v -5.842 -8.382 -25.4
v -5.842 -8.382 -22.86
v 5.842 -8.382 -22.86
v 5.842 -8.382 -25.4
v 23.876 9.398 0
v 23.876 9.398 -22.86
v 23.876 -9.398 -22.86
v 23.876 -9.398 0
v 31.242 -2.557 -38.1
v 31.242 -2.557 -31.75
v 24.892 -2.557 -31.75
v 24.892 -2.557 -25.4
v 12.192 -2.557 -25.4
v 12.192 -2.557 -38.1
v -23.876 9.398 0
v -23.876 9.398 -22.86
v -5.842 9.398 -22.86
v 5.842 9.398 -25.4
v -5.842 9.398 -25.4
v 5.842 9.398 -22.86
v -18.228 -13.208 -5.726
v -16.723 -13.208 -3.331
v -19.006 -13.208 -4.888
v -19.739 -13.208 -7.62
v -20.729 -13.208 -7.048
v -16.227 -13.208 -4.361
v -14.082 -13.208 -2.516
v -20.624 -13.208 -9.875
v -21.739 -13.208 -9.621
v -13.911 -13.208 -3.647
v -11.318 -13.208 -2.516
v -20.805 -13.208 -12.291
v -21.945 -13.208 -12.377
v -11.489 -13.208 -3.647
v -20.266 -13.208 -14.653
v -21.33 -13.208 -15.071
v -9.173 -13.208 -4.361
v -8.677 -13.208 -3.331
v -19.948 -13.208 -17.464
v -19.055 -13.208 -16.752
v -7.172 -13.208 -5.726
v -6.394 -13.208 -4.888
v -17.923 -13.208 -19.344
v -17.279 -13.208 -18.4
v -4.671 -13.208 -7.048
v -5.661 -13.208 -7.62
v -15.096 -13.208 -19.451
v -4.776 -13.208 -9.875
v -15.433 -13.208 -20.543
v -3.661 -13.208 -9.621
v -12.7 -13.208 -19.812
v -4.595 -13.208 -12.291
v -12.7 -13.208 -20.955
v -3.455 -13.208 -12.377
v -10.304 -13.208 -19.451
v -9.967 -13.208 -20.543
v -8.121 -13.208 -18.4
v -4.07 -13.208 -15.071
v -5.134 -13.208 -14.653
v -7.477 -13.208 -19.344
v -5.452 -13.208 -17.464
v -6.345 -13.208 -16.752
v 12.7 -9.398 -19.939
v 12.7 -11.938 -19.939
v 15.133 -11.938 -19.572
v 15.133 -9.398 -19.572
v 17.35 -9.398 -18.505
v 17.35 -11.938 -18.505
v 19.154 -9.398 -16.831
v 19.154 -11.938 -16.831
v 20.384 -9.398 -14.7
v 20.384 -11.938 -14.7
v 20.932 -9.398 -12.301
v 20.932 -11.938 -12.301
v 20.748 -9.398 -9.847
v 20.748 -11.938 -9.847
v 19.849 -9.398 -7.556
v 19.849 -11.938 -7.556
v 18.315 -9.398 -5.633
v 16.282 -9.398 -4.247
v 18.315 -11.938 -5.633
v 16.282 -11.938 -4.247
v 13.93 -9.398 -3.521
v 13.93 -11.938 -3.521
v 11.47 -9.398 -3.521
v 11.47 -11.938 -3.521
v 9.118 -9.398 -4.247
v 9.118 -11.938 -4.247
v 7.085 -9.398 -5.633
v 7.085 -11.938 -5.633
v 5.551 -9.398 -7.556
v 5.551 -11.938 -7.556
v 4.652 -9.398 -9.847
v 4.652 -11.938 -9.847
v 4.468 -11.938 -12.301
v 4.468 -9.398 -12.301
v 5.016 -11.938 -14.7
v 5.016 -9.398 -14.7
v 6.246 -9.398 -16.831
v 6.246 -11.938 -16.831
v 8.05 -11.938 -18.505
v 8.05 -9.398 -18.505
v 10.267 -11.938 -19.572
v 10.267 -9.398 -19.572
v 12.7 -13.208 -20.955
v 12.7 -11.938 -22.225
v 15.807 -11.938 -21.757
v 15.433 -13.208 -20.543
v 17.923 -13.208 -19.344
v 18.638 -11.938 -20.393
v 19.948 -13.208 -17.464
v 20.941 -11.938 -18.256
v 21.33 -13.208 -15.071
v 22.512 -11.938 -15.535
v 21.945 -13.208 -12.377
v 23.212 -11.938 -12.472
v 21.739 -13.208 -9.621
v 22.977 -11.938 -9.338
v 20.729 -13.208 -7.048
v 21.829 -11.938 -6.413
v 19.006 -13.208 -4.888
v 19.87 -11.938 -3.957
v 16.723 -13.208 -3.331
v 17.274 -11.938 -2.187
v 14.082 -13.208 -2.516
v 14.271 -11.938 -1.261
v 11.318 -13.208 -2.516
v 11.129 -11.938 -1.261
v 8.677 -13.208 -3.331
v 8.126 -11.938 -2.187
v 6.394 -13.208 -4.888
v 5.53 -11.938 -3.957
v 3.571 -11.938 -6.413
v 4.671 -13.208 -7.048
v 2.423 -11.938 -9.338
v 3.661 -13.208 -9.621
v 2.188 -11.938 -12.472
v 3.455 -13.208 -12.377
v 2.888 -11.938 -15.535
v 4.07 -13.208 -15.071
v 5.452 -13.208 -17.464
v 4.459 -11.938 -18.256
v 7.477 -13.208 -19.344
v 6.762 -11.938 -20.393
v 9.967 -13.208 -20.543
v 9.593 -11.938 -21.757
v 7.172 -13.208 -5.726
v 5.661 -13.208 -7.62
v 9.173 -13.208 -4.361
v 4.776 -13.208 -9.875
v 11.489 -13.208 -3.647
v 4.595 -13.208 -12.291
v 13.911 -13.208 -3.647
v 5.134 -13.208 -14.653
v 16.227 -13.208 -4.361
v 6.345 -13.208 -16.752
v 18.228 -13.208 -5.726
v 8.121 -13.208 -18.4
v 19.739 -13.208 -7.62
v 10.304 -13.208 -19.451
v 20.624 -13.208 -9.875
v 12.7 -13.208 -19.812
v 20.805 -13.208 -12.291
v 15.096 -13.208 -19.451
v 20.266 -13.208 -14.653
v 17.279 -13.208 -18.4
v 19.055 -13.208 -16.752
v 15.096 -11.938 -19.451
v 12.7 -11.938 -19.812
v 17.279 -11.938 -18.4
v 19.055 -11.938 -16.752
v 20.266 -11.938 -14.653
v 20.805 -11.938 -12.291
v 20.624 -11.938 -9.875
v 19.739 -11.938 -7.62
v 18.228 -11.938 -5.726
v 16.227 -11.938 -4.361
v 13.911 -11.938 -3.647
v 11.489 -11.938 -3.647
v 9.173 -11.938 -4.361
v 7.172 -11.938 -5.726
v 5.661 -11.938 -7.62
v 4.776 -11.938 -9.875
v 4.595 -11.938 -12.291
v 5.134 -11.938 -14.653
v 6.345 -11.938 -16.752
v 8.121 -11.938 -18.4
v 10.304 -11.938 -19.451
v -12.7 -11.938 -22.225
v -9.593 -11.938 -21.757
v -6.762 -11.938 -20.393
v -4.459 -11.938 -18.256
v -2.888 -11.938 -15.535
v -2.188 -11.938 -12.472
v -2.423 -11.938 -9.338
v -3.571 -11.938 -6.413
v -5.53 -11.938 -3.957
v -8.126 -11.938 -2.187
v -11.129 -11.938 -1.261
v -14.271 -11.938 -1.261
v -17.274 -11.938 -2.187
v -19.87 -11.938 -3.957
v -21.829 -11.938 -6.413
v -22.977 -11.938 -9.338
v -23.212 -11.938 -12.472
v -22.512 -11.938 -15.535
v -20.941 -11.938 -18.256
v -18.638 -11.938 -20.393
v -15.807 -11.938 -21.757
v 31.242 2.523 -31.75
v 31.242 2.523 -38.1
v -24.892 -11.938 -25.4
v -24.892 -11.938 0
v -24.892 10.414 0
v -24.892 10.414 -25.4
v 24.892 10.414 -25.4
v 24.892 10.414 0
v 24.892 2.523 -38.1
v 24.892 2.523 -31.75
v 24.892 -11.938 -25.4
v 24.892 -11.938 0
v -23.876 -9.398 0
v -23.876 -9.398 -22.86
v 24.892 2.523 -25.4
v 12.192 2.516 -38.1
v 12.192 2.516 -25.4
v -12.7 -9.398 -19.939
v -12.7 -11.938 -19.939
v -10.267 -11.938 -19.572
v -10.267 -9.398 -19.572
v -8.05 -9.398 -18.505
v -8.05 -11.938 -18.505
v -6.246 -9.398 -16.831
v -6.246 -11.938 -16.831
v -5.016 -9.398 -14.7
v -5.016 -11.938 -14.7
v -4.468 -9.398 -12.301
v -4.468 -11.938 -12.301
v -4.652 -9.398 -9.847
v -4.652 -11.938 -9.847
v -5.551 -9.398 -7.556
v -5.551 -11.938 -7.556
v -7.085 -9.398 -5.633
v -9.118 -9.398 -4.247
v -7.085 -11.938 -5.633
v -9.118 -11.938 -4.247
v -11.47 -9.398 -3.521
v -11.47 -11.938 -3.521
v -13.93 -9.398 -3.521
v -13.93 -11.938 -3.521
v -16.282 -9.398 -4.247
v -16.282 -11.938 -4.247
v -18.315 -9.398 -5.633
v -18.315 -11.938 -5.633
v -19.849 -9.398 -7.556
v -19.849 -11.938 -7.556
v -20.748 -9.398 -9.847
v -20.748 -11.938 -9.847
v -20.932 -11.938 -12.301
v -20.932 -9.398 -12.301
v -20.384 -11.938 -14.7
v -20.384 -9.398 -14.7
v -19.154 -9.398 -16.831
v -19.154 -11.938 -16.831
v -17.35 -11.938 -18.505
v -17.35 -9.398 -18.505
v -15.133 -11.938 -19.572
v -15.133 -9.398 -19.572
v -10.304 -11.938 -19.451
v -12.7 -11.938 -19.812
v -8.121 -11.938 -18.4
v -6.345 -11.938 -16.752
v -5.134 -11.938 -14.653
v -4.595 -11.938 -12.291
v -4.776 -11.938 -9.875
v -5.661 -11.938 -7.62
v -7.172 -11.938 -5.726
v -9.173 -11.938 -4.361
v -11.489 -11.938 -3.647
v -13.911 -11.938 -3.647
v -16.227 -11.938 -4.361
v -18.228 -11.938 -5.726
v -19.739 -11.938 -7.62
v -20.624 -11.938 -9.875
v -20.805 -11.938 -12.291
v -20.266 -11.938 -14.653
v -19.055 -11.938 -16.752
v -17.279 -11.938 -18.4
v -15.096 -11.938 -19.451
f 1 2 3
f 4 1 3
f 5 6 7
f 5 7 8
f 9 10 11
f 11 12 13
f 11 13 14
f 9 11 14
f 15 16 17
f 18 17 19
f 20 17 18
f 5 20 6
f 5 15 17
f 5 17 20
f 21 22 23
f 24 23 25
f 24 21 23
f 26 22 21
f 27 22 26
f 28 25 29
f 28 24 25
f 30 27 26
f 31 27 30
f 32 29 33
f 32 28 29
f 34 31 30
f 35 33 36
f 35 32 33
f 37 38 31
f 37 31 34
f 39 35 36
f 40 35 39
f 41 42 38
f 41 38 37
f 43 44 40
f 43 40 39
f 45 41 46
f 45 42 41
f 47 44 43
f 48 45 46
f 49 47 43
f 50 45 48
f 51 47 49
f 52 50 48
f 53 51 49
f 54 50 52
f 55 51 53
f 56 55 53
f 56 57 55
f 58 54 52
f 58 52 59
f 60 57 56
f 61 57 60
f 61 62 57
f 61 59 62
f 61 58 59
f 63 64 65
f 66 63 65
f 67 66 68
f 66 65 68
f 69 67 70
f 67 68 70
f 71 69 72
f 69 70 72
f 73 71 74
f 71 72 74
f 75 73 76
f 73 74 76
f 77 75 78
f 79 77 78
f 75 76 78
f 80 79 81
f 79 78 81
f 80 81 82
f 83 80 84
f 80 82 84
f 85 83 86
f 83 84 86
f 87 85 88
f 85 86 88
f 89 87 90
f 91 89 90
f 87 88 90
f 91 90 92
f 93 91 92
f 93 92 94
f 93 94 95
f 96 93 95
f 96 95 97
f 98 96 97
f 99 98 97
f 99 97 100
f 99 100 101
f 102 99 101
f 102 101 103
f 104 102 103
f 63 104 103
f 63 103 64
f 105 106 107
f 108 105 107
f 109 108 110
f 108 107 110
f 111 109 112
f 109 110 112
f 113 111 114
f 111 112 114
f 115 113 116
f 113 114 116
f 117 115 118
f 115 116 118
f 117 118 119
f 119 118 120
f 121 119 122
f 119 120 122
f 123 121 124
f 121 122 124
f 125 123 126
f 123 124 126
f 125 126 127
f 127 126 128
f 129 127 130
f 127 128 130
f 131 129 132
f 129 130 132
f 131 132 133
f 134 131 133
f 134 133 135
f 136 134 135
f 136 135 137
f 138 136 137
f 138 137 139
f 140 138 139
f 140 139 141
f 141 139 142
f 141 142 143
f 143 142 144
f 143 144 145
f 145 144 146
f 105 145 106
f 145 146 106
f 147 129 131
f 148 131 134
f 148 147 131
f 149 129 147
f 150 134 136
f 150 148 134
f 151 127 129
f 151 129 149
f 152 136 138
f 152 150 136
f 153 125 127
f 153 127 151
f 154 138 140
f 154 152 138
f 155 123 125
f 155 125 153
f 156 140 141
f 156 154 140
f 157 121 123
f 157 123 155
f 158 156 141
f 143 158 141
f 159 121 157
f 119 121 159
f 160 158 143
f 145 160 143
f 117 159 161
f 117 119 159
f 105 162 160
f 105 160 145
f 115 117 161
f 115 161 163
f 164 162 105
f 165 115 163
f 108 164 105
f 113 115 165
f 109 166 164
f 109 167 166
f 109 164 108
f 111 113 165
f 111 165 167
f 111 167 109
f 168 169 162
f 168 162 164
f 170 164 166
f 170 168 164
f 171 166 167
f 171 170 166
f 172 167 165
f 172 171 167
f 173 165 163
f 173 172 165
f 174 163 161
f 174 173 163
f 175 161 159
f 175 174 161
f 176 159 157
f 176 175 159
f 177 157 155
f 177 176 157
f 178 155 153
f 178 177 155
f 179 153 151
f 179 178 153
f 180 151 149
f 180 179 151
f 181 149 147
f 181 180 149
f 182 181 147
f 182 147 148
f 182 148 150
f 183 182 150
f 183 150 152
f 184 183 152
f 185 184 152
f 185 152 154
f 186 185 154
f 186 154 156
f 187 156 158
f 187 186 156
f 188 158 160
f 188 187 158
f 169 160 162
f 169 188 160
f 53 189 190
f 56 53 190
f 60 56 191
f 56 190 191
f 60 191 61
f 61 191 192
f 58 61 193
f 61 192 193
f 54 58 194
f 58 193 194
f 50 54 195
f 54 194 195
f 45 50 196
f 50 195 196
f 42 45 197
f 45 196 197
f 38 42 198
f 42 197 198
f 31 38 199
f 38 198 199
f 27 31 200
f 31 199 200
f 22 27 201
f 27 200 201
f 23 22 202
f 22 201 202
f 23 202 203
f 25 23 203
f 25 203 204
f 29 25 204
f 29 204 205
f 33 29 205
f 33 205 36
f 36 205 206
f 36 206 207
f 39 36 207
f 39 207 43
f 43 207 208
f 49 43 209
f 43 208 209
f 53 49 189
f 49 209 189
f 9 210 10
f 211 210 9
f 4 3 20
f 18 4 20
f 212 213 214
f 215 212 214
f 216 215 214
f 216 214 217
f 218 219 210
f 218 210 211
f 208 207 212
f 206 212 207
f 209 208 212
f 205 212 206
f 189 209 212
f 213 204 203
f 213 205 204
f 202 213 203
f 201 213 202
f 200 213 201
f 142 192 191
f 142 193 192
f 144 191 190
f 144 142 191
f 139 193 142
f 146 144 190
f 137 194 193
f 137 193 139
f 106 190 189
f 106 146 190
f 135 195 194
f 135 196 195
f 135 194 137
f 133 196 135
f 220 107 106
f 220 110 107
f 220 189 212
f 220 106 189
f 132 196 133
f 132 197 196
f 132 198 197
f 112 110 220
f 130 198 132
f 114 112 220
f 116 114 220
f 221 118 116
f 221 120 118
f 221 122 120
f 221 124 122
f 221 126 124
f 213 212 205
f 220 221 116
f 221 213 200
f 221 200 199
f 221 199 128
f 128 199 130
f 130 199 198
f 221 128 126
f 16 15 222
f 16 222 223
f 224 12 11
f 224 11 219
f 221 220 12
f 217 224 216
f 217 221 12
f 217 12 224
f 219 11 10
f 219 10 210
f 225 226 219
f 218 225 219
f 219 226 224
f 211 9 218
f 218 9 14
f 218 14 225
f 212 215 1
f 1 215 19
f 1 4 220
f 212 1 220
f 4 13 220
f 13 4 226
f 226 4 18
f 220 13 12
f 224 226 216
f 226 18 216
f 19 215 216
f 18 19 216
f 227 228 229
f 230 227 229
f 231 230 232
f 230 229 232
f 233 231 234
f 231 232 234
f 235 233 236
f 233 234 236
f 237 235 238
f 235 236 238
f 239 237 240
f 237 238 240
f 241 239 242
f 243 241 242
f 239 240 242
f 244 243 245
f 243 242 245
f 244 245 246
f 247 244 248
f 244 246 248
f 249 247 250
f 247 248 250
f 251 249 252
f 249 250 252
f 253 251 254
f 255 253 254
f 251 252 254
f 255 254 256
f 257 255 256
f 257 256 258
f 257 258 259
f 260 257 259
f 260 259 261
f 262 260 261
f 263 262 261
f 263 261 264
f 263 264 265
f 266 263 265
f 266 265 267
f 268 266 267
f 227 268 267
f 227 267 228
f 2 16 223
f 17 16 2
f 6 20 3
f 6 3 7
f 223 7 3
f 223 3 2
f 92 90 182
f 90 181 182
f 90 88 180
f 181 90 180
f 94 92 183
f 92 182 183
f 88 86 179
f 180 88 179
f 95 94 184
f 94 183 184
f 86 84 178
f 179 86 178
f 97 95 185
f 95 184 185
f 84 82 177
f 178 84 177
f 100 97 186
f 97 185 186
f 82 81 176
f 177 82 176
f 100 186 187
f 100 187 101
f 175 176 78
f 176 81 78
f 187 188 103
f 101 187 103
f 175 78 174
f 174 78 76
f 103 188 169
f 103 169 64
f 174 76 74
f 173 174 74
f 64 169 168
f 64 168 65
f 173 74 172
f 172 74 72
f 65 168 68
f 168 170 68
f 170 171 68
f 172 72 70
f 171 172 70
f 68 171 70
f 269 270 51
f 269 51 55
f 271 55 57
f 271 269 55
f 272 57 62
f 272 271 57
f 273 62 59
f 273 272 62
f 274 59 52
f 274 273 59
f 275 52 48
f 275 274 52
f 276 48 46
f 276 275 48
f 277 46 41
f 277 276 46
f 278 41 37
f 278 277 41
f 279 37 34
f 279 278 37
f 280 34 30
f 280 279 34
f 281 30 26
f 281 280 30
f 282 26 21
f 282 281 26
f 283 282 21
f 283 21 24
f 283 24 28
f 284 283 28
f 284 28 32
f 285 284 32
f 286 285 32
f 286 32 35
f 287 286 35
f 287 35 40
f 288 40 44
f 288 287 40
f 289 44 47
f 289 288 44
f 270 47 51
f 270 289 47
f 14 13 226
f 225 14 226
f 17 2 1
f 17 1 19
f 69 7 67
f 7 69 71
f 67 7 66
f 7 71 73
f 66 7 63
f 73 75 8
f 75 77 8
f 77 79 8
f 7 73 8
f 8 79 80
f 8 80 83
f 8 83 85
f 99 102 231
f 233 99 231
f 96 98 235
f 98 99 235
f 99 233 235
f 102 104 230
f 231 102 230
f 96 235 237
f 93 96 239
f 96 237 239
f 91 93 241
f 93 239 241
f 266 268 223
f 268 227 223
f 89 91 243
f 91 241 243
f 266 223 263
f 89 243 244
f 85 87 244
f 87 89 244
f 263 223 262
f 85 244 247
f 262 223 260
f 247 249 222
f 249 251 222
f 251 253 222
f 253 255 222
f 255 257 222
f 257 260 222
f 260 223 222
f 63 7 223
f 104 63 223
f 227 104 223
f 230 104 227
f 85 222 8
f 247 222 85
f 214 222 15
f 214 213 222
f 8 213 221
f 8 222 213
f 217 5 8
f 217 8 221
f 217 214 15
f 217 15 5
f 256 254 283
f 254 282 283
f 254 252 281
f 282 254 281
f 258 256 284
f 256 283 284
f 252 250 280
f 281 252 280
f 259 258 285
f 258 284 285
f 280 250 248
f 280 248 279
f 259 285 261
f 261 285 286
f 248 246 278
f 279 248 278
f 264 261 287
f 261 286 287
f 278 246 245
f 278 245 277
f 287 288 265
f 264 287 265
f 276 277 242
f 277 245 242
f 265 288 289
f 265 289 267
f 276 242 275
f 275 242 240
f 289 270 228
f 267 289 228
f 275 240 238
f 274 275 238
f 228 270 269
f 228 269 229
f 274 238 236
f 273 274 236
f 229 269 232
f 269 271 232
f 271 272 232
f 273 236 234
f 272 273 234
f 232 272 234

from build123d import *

# Parameters (mm, degrees)
SKETCH1_W           = 49.784
SKETCH1_H           = 23.876
BOSS_EXTRUDE1_DEPTH = 25.4
SHELL1_T            = -2.54
CUT_EXTRUDE1_REACH  = 44.835
SKETCH2_R           = 8.255
CUT_EXTRUDE2_REACH  = 37.843
SKETCH4_W           = 11.684
SKETCH4_H           = 17.78
SKETCH5_R           = 10.541
SKETCH5_R_2         = 8.128
BOSS_EXTRUDE3_DEPTH = 1.27
BOSS_EXTRUDE4_DEPTH = 12.7
SKETCH8_W           = 6.35
SKETCH8_H           = 5.08
BOSS_EXTRUDE5_DEPTH = 6.35
SKETCH9_W           = 22.86
SKETCH9_H           = 18.796
CUT_EXTRUDE3_DEPTH  = 1.524
SKETCH10_W          = 22.86
SKETCH10_H          = 18.796
CUT_EXTRUDE4_DEPTH  = 1.524
CHAMFER1_SIZE       = 1.27
SKETCH11_W          = 49.784
SKETCH11_H          = 25.4
CUT_EXTRUDE5_DEPTH  = 1.524


with BuildPart() as part:
    # Sketch1 → Boss-Extrude1 (new body)
    with BuildSketch(Plane.XY):
        Rectangle(SKETCH1_W, SKETCH1_H)
    extrude(amount=-BOSS_EXTRUDE1_DEPTH)

    # Shell1
    shell1_openings = [part.faces().sort_by_distance(p)[0] for p in [
        (0, 0, 0),
    ]]
    offset(amount=SHELL1_T, openings=shell1_openings, kind=Kind.INTERSECTION)

    # Sketch2 → Cut-Extrude1 (cut, up to next)
    with BuildSketch(Plane.XZ.offset(11.938), mode=Mode.PRIVATE) as cut_extrude1_sk1:
        with Locations(Location((-12.7, -11.684, 0), (0, 0, 270))):
            Circle(SKETCH2_R)
    cut_extrude1_tool1 = extrude(cut_extrude1_sk1.sketch, amount=-CUT_EXTRUDE1_REACH, mode=Mode.PRIVATE) & part.part
    # Sketch2 → Cut-Extrude1 (cut, up to next)
    with BuildSketch(Plane.XZ.offset(11.938), mode=Mode.PRIVATE) as cut_extrude1_sk2:
        with Locations(Location((12.7, -11.684, 0), (0, 0, 270))):
            Circle(SKETCH2_R)
    cut_extrude1_tool2 = extrude(cut_extrude1_sk2.sketch, amount=-CUT_EXTRUDE1_REACH, mode=Mode.PRIVATE) & part.part
    add(cut_extrude1_tool1.solids().sort_by_distance((-12.7, -11.938, -11.684))[0], mode=Mode.SUBTRACT)
    add(cut_extrude1_tool2.solids().sort_by_distance((12.7, -11.938, -11.684))[0], mode=Mode.SUBTRACT)

    # Sketch4 → Cut-Extrude2 (cut, up to next)
    with BuildSketch(Plane.XY.offset(-22.86), mode=Mode.PRIVATE) as cut_extrude2_sk1:
        with Locations((0, 0.508)):
            Rectangle(SKETCH4_W, SKETCH4_H)
    cut_extrude2_tool1 = extrude(cut_extrude2_sk1.sketch, amount=-CUT_EXTRUDE2_REACH, mode=Mode.PRIVATE) & part.part
    add(cut_extrude2_tool1.solids().sort_by_distance((0, 0.508, -22.86))[0], mode=Mode.SUBTRACT)

    # Sketch5 → Boss-Extrude3 (add)
    # profile 1 of 2: a face of its own
    with BuildSketch(Plane.XZ.offset(11.938)):
        with Locations(Location((-12.7, -11.684, 0), (0, 0, 270))):
            Circle(SKETCH5_R)
        with Locations(Location((-12.7, -11.684, 0), (0, 0, 270))):
            Circle(SKETCH5_R_2, mode=Mode.SUBTRACT)
    # profile 2 of 2: a face of its own
    with BuildSketch(Plane.XZ.offset(11.938)):
        with Locations(Location((12.7, -11.684, 0), (0, 0, 270))):
            Circle(SKETCH5_R)
        with Locations(Location((12.7, -11.684, 0), (0, 0, 270))):
            Circle(SKETCH5_R_2, mode=Mode.SUBTRACT)
    extrude(amount=BOSS_EXTRUDE3_DEPTH)

    # Sketch7 → Boss-Extrude4 (add)
    with BuildSketch(Plane(origin=(0, 0, -25.4), x_dir=(-1, 0, 0), z_dir=(0, 0, -1))):
        Polygon((-24.892, 2.522876328), (-24.892, -2.557123672), (-12.192, -2.557123672), (-12.192, 2.516226298), align=None)
    extrude(amount=BOSS_EXTRUDE4_DEPTH)

    # Sketch8 → Boss-Extrude5 (add)
    with BuildSketch(Plane(origin=(24.892, 0, 0), x_dir=(0, 0, -1), z_dir=(1, 0, 0))):
        with Locations((34.925, -0.017123672)):
            Rectangle(SKETCH8_W, SKETCH8_H)
    extrude(amount=BOSS_EXTRUDE5_DEPTH)

    # Sketch9 → Cut-Extrude3 (cut)
    with BuildSketch(Plane(origin=(-22.352, 0, 0), x_dir=(0, 0, -1), z_dir=(1, 0, 0))):
        with Locations((11.43, 0)):
            Rectangle(SKETCH9_W, SKETCH9_H)
    extrude(amount=-CUT_EXTRUDE3_DEPTH, mode=Mode.SUBTRACT)

    # Sketch10 → Cut-Extrude4 (cut)
    with BuildSketch(Plane.ZY.offset(-22.352)):
        with Locations((-11.43, 0)):
            Rectangle(SKETCH10_W, SKETCH10_H)
    extrude(amount=-CUT_EXTRUDE4_DEPTH, mode=Mode.SUBTRACT)

    # Chamfer1
    chamfer1_edges = [part.edges().sort_by_distance(p)[0] for p in [
        (-12.7, -13.208, -1.143),
        (12.7, -13.208, -1.143),
    ]]
    chamfer(chamfer1_edges, length=CHAMFER1_SIZE - 0.0001)  # a hair under: the kernel refuses the full size

    # Sketch11 → Cut-Extrude5 (cut)
    with BuildSketch(Plane(origin=(0, 11.938, 0), x_dir=(1, 0, 0), z_dir=(0, 1, 0))):
        with Locations((0, 12.7)):
            Rectangle(SKETCH11_W, SKETCH11_H)
    extrude(amount=-CUT_EXTRUDE5_DEPTH, mode=Mode.SUBTRACT)


solid = part.part
